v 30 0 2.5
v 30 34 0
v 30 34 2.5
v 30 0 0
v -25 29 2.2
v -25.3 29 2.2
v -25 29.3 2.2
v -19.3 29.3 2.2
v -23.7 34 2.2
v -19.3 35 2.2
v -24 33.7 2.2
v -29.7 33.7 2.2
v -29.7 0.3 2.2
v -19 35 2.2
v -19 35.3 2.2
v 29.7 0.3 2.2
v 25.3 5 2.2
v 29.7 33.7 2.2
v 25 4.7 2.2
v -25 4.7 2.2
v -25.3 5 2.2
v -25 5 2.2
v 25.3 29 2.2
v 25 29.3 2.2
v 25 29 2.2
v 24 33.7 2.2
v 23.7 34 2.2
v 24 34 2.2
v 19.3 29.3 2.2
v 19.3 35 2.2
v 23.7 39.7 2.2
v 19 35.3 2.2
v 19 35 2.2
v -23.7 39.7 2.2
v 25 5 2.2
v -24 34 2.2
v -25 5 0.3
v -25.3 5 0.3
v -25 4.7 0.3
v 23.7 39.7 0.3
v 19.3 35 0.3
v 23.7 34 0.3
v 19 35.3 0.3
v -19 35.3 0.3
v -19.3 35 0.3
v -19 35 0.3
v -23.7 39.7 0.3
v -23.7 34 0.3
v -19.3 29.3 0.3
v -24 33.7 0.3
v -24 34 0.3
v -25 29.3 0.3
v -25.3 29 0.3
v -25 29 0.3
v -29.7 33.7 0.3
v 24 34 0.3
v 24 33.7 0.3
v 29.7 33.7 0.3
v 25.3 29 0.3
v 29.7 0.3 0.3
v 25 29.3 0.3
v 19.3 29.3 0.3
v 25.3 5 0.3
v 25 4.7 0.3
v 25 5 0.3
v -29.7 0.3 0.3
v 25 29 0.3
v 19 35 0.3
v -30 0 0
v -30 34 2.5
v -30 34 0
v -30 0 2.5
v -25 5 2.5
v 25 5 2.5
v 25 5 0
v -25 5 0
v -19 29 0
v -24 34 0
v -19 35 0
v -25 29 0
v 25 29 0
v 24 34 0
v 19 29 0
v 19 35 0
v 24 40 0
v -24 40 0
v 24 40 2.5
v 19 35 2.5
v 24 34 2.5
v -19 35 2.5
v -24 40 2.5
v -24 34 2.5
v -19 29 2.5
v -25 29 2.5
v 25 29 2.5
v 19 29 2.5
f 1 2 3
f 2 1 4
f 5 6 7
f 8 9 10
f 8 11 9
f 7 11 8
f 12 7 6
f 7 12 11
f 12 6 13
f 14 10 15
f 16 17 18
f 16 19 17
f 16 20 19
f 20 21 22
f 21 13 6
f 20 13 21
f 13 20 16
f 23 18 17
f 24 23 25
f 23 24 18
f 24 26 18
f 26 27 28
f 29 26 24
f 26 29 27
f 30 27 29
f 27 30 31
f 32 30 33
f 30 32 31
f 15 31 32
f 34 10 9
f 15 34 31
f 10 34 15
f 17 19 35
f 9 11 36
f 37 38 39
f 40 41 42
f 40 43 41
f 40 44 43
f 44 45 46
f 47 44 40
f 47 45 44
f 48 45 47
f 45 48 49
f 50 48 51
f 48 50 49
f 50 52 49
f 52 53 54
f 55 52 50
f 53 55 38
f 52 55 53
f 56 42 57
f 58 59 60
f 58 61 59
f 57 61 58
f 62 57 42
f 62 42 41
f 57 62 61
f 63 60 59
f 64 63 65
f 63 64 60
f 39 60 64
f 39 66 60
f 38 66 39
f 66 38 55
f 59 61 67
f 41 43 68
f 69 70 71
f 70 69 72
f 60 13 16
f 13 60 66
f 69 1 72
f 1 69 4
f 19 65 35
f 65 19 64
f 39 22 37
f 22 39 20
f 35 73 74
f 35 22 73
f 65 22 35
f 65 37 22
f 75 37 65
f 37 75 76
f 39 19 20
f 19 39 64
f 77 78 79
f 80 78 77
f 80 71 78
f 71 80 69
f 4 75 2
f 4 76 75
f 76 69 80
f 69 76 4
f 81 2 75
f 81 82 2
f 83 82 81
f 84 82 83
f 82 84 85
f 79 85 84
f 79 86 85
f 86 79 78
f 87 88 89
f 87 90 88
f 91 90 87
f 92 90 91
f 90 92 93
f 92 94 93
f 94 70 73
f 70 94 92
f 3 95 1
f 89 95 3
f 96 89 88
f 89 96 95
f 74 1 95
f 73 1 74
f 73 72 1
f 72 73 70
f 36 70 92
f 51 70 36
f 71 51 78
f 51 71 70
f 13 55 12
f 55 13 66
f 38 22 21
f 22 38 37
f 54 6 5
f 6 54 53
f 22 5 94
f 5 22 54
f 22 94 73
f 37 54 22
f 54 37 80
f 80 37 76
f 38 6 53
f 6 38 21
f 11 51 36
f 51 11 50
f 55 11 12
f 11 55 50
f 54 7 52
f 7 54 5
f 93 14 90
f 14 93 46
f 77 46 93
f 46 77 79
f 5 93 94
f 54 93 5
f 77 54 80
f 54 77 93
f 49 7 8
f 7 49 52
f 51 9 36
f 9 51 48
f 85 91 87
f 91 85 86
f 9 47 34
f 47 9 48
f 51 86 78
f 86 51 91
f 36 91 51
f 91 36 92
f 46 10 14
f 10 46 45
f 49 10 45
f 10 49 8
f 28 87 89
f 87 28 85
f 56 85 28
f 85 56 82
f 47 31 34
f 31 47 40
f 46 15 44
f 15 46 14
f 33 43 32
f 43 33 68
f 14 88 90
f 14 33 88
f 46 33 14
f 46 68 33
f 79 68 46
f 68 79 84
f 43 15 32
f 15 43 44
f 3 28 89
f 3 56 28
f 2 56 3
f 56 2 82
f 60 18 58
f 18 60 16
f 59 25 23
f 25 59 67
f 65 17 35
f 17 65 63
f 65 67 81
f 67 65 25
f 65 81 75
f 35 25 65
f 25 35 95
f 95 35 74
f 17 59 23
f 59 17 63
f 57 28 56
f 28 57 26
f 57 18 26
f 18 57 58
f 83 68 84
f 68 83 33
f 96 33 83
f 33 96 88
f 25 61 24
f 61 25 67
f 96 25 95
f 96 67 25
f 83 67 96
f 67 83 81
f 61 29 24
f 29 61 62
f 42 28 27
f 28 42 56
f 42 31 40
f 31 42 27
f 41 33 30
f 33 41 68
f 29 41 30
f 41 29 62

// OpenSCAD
// file: hdim.scad
module hdim(x1 = 10, x2 = 20, y = 10, dimline_lenght = 9.0) 
{
    dimline_overlap = 0.5;
    dimline_width = 0.3;
    text_size = 2.5;
    tmp = 2*dimline_overlap+text_size/2;
    text_pos = dimline_lenght>0 ? tmp : -tmp; 
    dimline_abs = dimline_lenght>0 ? dimline_lenght : -dimline_lenght;
    
    color([0,0,0.6,1])
    {
        translate([x1,y-dimline_lenght/2,0]) 
            square([dimline_width, 
                dimline_abs + 2*dimline_overlap], 
                center=true, $fs=0.01);
                
        translate([x2,y-dimline_lenght/2,0]) 
            square([dimline_width, 
                dimline_abs + 2*dimline_overlap], 
                center=true, $fs=0.01);

        translate([(x1+x2)/2,y-dimline_lenght,0]) 
            square([x2-x1, 
                dimline_width], 
                center=true, $fs=0.01);
    }
        
    translate([(x1+x2)/2,y-dimline_lenght-text_pos,0]) 
    {
        color([0,0,0.6,1])
        cube([text_size * 5, 1.2*text_size, 0.9], center=true);
        
        color([0.9,0.9,0.7,1.0])
        {
            txt2 = round_dec(x2-x1);
            translate([0,0,0.2])
            text(txt2, size = text_size, 
                halign = "center",valign = "center");
            translate([0,0,-0.2])
            rotate([0,180,0])
            text(txt2, size = text_size, 
                halign = "center",valign = "center");
        }
    }
}

function round_dec(x) =
 ((search(".", str(0.1*round((x)*10))) == []) ? str(str(0.1*round((x)*10)), ".0") : str(0.1*round((x)*10)));

hdim();
// main file
use <hdim.scad> 

default_bar_w = 5.0;
default_bar_h = 2.5;
default_bar_t  = 0.3;
explode_d = 25;

module rectbar_frame(length = 60, 
    width = 40, 
    bar_w = default_bar_w,  /* Width */
    bar_h = default_bar_h,  /* Height */
    bar_t = default_bar_t,  /* Metal thickness */
    c = "red",              /* Color 1 */
    c2 = "darkred",         /* Color 2 */
    corner1_cut = 6.0,
    corner2_cut = 6.0,
    electric_box_cut = 0,  /* Electric box cut */ 
    explode = false)        
{
    d = explode ? explode_d : 0;

    rectbar_single(length, 
        bar_w, bar_h, bar_t, c, 
        -1, -1, explode);
    
    translate([-length/2-d,width/2-corner1_cut/2,0]) 
    rotate([0,0,-90])
    rectbar_single(width-corner1_cut, 
        bar_w, bar_h, bar_t, c2, 
        -1, -1, explode);
    
    translate([-length/2+corner1_cut/2-d/2,
            width - corner1_cut,0]) 
    rotate([0,0,180])
    rectbar_single(corner1_cut, 
        bar_w, bar_h, bar_t, c, 
        1, -1, explode);

    translate([-length/2+corner1_cut,
        width-corner1_cut/2+d/2,0]) 
    rotate([0,0,-90])
    rectbar_single(corner1_cut, 
        bar_w, bar_h, bar_t, c2, 
        -1, 1, explode);

    if (electric_box_cut <= 0)
    {
        translate([(corner1_cut-corner2_cut)/2,
            width+d,0]) 
        rotate([0,0,180])
        rectbar_single(length 
            - corner1_cut - corner2_cut, 
            bar_w, bar_h, bar_t, c, 
            -1, -1, explode);

        translate([length/2+d,
            width/2-corner2_cut/2,0]) 
        rotate([0,0,90])
        rectbar_single(width-corner2_cut, 
            bar_w, bar_h, bar_t, c2, 
            -1, -1, explode);

        translate([length/2-corner2_cut/2+d/2,
                width - corner2_cut,0]) 
        rotate([0,0,180])
        rectbar_single(corner2_cut, 
            bar_w, bar_h, bar_t, c, 
            -1, 1, explode);

        translate([length/2-corner2_cut,
            width-corner2_cut/2+d/2,0]) 
        rotate([0,0,90])
        rectbar_single(corner2_cut, 
            bar_w, bar_h, bar_t, c2, 
            1, -1, explode); 
    }
    else {
        translate([length/2+d,
            width/2-corner2_cut/2,0]) 
        rotate([0,0,90])
        rectbar_single(width-corner2_cut, 
            bar_w, bar_h, bar_t, c2, 
            -1, 0, explode);

        translate([length/2+d - electric_box_cut - corner2_cut,
            width/2+bar_w/2,0]) 
        rotate([0,0,90])
        rectbar_single(width-bar_w, 
            bar_w, bar_h, bar_t, c2, 
            0, -1, explode);

        translate([(corner1_cut 
            - corner2_cut - electric_box_cut)/2,
            width+d,0]) 
        rotate([0,0,180])
        rectbar_single(length
            - corner1_cut 
            - corner2_cut 
            - electric_box_cut, 
            bar_w, bar_h, bar_t, c, 
            -1, -1, explode);
    }
       
} 

module rectbar_single(length = 50, 
    bar_w = default_bar_w,  /* Width */
    bar_h = default_bar_h,  /* Height */
    bar_t = default_bar_t,  /* Metal thickness */
    c = "red",              /* Color */
    extend_cut1 = -1,       /* -1=shorten, 1=lengthen, 0=flat cut */
    extend_cut2 = -1,
    show_dims = false)
{
    rectbar_helper(length, 
        bar_w, bar_h, bar_t, c,
        extend_cut1, extend_cut2);

    translate([0, 0, bar_h - bar_t])
    {
        rectbar_helper(length, 
            bar_w, bar_h, bar_t, c,
            extend_cut1, extend_cut2);
        
        if (show_dims) {
            hdim(-length/2, length/2, 0, 3);
        }
    }
    
    color(c)
    {
        x = -length/2;
        l = length;
        
        translate([x, 0, bar_t])
        cube([l, bar_t, bar_h-2*bar_t]);
        
        dx1 = extend_cut1 * bar_w;
        dx2 = extend_cut2 * bar_w;
        l2 = l + dx1 + dx2;

        translate([x-dx1, bar_w-bar_t, bar_t])
        cube([l2, bar_t, bar_h-2*bar_t]);
    }
}

module rectbar_helper(length = 50, 
    bar_w = default_bar_w,  /* Width */
    bar_h = default_bar_h,  /* Height */
    bar_t = default_bar_t,  /* Metal thickness */
    c = "red",              /* Color */
    extend_cut1 = -1,
    extend_cut2 = -1)
{
    color(c) 
    {
        translate([-length/2, 0, 0])
        {
            dx1 = extend_cut1 * -bar_w;
            dx2 = extend_cut2 * bar_w;
            linear_extrude(bar_t) 
            polygon(points=[[0,0],
                [dx1, bar_w],
                [length+dx2, bar_w],
                [length, 0], [0,0]]);
        }
    }
}   

module rectbar_simple(length = 60, 
    bar_w = default_bar_w,  /* Width */
    bar_h = default_bar_h,  /* Height */
    c = "orange")
{
    color(c) 
    {
        cube([length, bar_w, bar_h], center = true);
    }
}

rectbar_frame();
// rectbar_single(50, default_bar_w, default_bar_h, default_bar_t, "red", -1, -1, true);
// rectbar_helper();
// rectbar_simple();
